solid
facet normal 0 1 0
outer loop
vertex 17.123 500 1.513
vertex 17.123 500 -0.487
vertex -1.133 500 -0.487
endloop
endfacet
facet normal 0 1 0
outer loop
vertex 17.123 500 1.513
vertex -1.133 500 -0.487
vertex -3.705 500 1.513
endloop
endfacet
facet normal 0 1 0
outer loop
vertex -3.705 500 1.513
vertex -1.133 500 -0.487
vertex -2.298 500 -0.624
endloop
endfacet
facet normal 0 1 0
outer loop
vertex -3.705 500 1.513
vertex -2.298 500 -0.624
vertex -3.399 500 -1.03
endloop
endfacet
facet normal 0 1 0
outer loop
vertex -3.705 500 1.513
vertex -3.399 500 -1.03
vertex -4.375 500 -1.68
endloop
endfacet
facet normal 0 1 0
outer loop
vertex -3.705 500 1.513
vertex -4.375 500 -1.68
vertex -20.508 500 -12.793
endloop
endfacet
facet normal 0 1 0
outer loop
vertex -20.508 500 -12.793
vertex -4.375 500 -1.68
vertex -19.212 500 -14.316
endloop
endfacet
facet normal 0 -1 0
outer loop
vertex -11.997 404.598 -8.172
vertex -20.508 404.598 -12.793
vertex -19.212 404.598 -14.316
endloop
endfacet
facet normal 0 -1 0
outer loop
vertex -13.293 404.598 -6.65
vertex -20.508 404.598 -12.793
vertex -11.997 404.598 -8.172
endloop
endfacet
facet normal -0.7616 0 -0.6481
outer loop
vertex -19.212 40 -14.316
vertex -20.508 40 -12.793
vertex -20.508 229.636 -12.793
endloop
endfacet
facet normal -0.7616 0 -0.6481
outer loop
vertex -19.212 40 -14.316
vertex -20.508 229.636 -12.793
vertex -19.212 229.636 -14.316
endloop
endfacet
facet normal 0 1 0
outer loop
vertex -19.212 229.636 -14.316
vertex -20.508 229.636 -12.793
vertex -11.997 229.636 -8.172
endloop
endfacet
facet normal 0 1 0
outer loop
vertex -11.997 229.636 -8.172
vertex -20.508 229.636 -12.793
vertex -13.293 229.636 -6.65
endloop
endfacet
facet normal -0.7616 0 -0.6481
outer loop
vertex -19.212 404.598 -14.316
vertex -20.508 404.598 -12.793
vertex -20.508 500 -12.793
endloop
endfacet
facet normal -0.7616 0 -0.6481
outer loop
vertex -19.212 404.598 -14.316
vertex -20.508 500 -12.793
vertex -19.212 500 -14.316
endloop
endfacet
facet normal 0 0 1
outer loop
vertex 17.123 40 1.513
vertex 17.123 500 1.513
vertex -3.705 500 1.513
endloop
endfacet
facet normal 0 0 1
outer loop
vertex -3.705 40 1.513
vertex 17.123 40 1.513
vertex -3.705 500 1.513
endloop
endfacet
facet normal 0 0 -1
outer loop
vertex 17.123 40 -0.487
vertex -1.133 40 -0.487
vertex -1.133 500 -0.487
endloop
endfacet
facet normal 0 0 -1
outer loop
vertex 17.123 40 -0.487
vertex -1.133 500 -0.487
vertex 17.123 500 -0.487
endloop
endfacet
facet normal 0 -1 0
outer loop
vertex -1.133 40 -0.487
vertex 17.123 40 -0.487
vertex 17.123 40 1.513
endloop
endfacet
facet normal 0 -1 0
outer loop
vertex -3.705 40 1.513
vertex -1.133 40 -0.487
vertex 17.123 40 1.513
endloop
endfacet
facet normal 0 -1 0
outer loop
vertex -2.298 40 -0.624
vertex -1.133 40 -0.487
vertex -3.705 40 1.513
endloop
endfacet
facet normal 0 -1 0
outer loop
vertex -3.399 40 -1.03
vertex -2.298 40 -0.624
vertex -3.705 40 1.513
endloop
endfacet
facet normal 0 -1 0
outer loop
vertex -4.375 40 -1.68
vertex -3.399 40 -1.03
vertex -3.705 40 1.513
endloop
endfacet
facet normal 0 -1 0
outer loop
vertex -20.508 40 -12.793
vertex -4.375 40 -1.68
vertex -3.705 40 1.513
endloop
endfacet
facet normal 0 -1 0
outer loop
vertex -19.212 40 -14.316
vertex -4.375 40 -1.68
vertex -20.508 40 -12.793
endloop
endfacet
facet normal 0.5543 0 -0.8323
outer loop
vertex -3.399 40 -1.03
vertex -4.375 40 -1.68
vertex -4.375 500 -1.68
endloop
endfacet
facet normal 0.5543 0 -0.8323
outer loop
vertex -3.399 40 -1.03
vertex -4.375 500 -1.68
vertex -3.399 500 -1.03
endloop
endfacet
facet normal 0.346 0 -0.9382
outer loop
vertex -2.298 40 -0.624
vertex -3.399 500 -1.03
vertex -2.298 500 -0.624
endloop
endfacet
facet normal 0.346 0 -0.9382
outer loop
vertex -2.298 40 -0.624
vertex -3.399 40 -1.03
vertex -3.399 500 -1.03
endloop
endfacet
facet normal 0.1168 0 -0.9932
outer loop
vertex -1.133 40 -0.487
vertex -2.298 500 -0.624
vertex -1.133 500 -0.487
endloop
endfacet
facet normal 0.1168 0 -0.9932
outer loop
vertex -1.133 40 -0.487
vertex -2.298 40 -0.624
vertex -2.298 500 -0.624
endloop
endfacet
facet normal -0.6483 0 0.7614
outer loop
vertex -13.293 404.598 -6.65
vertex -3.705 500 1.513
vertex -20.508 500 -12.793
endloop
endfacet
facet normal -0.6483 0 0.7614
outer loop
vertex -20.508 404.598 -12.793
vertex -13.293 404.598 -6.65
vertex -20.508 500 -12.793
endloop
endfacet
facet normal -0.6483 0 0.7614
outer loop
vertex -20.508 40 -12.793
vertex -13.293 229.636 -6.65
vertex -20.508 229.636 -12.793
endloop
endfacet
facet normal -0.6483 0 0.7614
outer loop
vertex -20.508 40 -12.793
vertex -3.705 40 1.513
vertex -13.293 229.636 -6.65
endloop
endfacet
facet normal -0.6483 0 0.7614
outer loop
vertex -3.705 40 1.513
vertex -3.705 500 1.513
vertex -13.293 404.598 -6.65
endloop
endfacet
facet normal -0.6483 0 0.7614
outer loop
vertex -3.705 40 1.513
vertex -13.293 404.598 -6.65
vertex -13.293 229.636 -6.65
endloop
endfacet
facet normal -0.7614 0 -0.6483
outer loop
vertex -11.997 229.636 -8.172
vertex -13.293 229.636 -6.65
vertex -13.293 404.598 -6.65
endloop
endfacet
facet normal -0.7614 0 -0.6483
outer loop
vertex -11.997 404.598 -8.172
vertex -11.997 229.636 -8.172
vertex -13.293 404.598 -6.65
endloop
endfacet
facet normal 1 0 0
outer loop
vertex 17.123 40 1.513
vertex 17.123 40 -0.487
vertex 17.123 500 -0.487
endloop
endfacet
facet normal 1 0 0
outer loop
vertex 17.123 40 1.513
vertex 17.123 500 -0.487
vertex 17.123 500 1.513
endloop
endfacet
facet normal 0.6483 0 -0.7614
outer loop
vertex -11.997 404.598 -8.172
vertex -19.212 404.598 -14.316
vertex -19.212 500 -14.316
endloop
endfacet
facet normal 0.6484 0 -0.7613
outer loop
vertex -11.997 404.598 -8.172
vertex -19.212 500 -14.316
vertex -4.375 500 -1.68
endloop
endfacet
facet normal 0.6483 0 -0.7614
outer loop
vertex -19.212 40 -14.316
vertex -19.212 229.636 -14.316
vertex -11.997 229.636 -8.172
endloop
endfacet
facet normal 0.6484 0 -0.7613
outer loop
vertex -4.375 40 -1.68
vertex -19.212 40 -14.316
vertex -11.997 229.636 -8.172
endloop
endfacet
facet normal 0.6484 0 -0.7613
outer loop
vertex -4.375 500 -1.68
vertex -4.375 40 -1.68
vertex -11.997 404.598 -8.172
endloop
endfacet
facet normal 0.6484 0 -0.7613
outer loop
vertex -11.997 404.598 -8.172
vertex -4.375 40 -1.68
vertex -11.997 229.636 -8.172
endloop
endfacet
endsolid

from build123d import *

# Parameters (mm, degrees)
EXTRUDE_START       = 40
EXTRUDE_1_DEPTH     = 460
SKETCH_2_W          = 14.817451962
SKETCH_2_H          = 174.961932368
CUT_EXTRUDE_1_DEPTH = 501.666670065


with BuildPart() as part:
    # Эскиз1 → Вытянуть1 (new body)
    with BuildSketch(Plane(origin=(0, 0, 0), x_dir=(1, 0, 0), z_dir=(0, 1, 0)).offset(EXTRUDE_START)):
        with BuildLine():
            Line((-20.508447565, 12.792651291), (-19.211965496, 14.315521688))
            Line((-19.211965496, 14.315521688), (-4.37520086, 1.680230584))
            ThreePointArc((-4.37520086, 1.680230584), (-2.860623355, 0.794693725), (-1.133379225, 0.48688167))
            Line((-1.133379225, 0.48688167), (17.122829042, 0.48688167))
            Line((17.122829042, 0.48688167), (17.122829042, -1.51311833))
            Line((17.122829042, -1.51311833), (-3.70464164, -1.51311833))
            Line((-3.70464164, -1.51311833), (-20.508447565, 12.792651291))
        make_face()
    extrude(amount=EXTRUDE_1_DEPTH)

    # Эскиз2 → Вырез-Вытянуть1 (cut, through all)
    with BuildSketch(Plane(origin=(-2.30361675, 0, 2.705868318), x_dir=(0.7614351985155554, 0, 0.6482410342315402), z_dir=(-0.6482410342315401, 0, 0.7614351985155553))):
        with Locations((-21.841147888, 317.116726633)):
            Rectangle(SKETCH_2_W, SKETCH_2_H)
    extrude(amount=-CUT_EXTRUDE_1_DEPTH, mode=Mode.SUBTRACT)


solid = part.part
